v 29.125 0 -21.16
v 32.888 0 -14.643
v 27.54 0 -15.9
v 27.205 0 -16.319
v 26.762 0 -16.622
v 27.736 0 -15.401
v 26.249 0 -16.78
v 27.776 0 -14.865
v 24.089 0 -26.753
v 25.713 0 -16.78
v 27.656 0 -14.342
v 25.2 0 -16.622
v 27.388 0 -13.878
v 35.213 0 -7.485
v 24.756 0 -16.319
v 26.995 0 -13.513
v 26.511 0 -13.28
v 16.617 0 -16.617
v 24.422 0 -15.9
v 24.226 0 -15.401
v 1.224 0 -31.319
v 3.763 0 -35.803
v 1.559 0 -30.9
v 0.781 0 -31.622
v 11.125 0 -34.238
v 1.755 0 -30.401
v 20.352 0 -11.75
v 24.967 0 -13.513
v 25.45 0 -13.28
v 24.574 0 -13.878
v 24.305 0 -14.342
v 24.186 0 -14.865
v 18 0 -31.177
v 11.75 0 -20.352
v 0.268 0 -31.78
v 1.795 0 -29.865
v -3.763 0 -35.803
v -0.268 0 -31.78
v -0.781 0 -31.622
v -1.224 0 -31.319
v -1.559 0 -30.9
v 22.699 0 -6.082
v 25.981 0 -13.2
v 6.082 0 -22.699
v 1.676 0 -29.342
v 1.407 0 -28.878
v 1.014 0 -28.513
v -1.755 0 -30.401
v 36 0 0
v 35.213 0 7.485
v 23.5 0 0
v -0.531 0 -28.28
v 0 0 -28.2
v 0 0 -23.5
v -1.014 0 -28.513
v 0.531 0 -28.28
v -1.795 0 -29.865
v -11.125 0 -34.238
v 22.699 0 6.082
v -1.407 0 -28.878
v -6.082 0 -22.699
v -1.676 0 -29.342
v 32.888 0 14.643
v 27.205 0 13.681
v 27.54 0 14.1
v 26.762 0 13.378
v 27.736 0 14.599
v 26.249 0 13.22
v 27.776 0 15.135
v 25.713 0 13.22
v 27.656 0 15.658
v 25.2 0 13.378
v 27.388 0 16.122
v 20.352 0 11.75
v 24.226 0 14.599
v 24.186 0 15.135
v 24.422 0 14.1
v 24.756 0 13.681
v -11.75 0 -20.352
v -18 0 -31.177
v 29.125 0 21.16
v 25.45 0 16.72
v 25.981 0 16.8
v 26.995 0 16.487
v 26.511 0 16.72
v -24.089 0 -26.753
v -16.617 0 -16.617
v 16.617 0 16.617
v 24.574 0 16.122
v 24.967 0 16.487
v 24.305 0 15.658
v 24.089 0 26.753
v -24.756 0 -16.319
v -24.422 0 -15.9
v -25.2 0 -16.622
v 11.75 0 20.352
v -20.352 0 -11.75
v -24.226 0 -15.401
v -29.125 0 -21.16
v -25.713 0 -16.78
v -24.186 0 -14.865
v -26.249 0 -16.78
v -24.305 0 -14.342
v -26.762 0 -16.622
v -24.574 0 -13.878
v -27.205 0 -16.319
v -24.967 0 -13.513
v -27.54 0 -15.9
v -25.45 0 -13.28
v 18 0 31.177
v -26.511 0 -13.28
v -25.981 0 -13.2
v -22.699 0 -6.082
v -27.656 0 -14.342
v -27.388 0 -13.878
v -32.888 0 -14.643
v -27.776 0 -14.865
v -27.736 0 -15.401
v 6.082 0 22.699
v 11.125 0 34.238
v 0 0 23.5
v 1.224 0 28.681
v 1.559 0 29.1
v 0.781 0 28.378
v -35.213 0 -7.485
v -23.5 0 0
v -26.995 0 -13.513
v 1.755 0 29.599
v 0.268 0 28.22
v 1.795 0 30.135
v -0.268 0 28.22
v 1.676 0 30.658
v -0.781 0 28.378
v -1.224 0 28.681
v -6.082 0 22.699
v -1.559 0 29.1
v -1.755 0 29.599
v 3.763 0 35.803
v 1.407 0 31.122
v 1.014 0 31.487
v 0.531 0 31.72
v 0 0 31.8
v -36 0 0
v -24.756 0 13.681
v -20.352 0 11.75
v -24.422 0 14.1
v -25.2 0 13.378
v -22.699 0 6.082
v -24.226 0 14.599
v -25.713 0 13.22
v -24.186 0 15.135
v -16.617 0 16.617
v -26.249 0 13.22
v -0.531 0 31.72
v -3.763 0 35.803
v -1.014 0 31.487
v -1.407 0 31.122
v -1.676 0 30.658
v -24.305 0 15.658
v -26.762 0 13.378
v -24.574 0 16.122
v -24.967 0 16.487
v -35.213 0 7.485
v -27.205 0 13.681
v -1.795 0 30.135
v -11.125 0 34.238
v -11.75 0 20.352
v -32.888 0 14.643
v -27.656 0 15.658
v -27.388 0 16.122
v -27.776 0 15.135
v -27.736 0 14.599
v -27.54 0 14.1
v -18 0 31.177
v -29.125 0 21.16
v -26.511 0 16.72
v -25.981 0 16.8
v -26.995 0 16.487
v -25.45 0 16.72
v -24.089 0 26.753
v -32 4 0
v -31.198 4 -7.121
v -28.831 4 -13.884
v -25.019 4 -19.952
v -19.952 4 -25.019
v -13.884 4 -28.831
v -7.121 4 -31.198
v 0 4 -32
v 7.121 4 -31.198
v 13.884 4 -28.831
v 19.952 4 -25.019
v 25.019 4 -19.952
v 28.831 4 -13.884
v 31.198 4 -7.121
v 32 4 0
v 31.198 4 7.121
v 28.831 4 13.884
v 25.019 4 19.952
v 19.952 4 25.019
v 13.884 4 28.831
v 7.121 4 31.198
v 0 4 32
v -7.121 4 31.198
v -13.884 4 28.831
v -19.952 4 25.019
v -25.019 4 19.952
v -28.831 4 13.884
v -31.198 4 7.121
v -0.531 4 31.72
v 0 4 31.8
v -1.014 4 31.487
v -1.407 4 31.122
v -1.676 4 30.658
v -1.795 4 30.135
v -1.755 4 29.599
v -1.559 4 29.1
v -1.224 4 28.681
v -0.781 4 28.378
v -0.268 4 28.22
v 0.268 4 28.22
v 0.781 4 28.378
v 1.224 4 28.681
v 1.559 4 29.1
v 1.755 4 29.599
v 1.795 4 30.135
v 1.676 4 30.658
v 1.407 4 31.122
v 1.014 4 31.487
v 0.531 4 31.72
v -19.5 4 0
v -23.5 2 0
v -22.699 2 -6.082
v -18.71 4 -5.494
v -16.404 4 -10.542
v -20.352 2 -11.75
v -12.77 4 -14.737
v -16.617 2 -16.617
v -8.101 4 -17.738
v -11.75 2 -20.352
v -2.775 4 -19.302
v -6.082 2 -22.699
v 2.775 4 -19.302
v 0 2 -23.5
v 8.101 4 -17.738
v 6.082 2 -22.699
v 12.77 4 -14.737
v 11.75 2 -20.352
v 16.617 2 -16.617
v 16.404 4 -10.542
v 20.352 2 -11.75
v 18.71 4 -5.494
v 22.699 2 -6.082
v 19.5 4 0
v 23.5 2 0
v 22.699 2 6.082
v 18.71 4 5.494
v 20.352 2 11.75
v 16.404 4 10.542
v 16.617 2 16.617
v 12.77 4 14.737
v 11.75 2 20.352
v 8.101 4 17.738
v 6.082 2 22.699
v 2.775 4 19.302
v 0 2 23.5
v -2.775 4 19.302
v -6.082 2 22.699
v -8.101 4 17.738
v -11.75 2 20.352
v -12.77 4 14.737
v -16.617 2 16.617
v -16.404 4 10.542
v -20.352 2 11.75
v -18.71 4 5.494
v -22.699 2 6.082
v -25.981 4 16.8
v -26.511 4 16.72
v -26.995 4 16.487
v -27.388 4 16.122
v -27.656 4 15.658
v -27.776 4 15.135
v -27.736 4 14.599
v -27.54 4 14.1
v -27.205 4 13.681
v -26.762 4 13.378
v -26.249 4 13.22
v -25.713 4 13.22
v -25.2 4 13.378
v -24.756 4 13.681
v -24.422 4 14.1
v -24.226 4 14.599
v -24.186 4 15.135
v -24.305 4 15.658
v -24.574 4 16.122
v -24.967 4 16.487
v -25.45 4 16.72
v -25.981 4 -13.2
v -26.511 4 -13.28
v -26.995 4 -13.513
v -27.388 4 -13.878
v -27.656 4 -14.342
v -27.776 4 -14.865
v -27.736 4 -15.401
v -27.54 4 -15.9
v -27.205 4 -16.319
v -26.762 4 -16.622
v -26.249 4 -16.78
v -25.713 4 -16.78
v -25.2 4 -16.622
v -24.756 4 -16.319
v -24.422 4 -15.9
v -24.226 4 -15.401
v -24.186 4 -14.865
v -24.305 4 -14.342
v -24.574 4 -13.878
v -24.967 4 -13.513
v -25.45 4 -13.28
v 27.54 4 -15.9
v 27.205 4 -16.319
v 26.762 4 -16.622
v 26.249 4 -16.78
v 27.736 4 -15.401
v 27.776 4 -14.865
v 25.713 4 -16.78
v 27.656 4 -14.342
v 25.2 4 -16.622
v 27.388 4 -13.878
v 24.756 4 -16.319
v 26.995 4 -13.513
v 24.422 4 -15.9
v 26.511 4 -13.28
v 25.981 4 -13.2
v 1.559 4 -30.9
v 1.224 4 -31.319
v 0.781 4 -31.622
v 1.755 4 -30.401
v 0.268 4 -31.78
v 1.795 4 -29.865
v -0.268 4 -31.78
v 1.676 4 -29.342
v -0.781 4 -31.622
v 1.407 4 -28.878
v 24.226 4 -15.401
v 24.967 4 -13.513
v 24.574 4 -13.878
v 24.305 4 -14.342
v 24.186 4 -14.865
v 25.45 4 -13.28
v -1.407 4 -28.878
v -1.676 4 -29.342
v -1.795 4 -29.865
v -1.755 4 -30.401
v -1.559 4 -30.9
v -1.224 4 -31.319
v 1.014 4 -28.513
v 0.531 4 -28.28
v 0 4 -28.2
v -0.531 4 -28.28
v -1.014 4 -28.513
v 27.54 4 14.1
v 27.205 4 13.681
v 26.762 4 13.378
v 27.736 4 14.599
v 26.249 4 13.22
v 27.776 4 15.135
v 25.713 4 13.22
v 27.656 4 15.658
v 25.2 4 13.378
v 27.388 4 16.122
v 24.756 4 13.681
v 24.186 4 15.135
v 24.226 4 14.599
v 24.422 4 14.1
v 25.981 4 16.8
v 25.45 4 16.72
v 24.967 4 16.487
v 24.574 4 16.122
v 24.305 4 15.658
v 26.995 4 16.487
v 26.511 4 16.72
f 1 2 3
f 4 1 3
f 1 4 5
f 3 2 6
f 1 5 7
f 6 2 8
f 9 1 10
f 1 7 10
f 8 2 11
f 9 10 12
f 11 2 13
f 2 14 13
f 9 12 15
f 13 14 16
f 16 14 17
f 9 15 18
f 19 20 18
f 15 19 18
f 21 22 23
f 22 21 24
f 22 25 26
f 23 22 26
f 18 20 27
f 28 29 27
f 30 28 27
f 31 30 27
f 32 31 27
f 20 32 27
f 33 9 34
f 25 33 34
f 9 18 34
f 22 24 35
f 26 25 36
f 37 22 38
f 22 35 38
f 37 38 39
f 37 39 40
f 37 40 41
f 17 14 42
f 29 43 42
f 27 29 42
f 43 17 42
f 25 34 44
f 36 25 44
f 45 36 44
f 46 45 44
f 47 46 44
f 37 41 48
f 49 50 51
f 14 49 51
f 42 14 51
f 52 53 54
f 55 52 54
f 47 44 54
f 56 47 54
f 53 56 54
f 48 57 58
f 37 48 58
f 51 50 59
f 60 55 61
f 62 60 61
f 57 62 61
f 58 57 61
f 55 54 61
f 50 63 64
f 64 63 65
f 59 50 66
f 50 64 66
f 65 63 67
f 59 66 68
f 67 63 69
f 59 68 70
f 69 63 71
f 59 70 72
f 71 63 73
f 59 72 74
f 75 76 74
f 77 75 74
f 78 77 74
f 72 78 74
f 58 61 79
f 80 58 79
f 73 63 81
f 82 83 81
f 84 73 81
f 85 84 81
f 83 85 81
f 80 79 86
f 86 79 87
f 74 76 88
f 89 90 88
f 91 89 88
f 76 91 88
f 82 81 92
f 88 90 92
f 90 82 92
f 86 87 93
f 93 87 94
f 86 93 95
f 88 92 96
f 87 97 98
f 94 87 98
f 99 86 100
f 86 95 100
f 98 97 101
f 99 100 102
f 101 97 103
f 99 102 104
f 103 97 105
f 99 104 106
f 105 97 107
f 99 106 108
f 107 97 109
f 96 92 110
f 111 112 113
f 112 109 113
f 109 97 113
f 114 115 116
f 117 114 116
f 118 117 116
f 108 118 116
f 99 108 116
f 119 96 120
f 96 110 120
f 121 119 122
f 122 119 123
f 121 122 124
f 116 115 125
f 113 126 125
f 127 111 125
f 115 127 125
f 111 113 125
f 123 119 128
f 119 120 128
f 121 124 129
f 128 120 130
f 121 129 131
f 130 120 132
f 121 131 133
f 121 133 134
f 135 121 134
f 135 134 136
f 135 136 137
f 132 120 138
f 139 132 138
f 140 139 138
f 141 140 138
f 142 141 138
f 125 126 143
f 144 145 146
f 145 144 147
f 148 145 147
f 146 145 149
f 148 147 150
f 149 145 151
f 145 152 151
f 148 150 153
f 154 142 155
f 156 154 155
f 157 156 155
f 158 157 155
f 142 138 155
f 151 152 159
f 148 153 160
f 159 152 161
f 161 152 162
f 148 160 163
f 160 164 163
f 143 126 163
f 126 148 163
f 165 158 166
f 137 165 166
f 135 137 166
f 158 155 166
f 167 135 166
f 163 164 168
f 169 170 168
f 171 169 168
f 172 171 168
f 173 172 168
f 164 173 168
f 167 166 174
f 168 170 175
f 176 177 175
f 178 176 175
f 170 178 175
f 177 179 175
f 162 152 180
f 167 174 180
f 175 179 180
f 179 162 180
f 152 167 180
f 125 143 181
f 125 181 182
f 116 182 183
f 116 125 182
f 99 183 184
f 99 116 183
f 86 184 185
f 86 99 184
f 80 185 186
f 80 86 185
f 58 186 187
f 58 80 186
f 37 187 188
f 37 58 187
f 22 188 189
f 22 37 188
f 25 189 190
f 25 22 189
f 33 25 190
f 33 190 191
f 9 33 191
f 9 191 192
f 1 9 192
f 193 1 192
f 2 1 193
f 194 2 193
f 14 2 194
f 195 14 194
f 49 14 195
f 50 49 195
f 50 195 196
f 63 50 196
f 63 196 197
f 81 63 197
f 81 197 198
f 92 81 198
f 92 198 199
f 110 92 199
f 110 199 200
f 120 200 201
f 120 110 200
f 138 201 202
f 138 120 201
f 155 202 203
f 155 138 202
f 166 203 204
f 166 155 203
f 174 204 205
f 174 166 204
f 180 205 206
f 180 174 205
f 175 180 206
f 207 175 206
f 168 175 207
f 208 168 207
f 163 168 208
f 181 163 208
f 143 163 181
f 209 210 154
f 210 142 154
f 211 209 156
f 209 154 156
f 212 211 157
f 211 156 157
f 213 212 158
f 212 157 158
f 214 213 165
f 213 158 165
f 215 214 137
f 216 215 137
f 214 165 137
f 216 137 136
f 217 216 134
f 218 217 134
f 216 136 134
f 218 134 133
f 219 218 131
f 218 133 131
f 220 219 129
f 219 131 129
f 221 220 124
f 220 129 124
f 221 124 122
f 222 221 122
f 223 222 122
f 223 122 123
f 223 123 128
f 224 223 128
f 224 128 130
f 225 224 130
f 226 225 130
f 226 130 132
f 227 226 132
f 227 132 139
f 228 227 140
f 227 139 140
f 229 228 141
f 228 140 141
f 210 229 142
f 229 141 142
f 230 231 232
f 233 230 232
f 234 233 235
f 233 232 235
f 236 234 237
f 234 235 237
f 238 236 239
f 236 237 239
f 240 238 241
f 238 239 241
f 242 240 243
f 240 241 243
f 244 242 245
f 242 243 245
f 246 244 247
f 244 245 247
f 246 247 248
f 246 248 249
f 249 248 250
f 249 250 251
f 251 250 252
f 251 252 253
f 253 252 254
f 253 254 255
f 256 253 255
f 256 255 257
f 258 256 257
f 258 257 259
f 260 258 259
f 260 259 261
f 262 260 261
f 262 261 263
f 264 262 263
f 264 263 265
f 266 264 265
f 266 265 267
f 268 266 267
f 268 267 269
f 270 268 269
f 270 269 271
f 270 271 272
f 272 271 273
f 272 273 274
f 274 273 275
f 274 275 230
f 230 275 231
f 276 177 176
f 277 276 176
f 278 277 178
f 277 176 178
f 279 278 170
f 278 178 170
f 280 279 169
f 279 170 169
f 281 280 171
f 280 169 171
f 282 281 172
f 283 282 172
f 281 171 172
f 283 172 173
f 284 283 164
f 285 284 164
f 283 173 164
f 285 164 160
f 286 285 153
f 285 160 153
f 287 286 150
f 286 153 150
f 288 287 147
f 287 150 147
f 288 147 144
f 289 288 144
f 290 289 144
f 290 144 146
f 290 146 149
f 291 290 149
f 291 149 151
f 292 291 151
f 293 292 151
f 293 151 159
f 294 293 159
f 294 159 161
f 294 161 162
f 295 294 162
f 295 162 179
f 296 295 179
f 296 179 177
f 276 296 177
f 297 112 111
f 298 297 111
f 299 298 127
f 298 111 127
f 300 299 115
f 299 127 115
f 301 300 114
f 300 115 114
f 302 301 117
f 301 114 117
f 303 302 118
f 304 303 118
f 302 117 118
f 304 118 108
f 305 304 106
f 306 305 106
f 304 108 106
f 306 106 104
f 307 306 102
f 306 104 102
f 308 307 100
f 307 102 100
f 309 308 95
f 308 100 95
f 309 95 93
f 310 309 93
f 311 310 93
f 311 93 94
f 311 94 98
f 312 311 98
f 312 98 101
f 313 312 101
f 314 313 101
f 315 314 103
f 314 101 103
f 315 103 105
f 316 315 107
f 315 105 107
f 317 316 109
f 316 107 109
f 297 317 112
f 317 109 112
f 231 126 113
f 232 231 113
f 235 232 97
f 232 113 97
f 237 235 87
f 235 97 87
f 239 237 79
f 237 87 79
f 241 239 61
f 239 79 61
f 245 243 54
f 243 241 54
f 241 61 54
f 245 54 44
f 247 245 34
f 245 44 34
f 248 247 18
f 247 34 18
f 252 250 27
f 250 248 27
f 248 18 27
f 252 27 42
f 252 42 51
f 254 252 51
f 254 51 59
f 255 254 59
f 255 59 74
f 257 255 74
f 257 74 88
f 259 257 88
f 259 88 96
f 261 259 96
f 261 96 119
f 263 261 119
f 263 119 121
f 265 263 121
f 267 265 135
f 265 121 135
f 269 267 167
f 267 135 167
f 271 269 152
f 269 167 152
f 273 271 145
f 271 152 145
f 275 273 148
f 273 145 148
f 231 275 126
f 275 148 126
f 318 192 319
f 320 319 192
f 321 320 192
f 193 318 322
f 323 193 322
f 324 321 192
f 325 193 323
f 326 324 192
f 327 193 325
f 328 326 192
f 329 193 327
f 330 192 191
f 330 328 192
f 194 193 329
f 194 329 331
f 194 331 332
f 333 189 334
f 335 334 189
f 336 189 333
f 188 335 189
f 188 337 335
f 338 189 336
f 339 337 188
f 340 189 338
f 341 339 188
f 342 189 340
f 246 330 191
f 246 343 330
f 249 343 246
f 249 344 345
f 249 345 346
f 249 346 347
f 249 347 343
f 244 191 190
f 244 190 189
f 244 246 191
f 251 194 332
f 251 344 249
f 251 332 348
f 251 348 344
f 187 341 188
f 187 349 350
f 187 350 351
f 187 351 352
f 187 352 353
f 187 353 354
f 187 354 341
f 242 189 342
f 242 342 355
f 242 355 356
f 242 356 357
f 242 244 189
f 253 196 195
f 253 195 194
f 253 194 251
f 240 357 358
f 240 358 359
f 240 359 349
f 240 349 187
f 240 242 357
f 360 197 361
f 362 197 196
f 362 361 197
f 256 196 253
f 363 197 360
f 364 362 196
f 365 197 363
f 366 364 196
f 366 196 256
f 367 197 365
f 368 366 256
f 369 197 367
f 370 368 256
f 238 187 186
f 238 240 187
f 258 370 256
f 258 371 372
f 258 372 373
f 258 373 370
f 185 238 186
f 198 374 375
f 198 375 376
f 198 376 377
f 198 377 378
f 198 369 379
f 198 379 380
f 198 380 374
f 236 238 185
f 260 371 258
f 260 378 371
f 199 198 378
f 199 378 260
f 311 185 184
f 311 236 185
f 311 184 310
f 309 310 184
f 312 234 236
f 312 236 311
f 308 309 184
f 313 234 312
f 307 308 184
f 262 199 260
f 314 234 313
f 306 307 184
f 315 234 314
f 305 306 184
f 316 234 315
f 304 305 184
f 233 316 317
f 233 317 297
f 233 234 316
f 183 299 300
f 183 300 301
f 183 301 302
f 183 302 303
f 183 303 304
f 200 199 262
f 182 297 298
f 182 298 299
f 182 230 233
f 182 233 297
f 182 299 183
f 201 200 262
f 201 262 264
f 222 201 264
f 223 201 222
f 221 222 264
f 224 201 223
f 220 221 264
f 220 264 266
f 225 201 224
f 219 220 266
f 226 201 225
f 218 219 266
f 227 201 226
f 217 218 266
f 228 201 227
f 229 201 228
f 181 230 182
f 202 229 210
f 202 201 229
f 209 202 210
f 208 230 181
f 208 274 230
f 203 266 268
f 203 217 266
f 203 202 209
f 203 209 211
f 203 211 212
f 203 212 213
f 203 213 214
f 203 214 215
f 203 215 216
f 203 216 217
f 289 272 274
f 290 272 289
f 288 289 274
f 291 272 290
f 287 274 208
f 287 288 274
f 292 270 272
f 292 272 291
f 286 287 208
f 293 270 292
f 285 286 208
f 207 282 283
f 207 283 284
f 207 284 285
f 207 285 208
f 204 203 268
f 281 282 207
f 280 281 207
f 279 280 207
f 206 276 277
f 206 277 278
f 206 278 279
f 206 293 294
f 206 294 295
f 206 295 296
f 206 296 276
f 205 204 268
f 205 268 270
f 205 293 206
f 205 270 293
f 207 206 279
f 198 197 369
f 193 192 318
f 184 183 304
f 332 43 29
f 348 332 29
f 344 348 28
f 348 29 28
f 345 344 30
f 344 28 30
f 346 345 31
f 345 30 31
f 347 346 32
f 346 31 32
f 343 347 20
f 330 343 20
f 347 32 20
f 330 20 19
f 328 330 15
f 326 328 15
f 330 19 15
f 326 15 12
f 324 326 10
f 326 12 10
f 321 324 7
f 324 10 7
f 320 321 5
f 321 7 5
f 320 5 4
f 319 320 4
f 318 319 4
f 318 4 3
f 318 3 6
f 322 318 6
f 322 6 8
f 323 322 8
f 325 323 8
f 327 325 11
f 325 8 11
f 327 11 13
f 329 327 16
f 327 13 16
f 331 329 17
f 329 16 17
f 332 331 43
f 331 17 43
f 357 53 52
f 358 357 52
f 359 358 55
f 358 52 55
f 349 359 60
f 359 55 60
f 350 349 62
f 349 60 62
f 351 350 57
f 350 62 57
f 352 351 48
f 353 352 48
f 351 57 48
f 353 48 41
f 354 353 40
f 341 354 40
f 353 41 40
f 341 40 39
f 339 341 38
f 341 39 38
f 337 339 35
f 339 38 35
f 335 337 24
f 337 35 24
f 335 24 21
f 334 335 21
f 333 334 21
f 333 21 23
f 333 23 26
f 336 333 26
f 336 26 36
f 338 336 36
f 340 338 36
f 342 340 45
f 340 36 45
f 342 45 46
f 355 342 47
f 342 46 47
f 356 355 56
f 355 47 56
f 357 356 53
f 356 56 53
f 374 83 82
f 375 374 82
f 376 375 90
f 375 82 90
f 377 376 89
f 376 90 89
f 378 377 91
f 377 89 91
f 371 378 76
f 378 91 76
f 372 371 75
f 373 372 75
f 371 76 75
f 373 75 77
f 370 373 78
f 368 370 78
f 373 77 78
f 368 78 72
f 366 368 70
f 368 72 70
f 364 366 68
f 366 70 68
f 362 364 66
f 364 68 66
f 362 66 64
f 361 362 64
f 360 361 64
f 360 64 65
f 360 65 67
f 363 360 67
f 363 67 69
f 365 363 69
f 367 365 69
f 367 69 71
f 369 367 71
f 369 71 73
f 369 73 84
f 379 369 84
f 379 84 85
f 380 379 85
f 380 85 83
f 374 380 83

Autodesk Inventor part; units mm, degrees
ref_plane "YZ Plane" through (0, 0, 0) normal (1, 0, 0) x (0, 1, 0)
ref_plane "XZ Plane" through (0, 0, 0) normal (0, 1, 0) x (-1, 0, 0)
ref_plane "XY Plane" through (0, 0, 0) normal (0, 0, 1) x (1, 0, 0)
sketch "Sketch1" plane through (0, 0, 0) normal (0, 0, 1) x (1, 0, 0)
  line L0 (0, 0) -> (0, 4)
  line L1 (-23.5, 0) -> (-36, 0)
  line L2 (-36, 0) -> (-32, 4)
  line L3 (-32, 4) -> (-19.5, 4)
  line L4 (-19.5, 4) -> (-23.5, 2)
  line L5 (-23.5, 2) -> (-23.5, 0)
  point P0 (-29.75, 0)
  dimension "d0" = 47
  dimension "d1" = 12.5
  dimension "d2" = 2
  dimension "d3" = 4
  dimension "d4" = 2
  dimension "d5" = 45
revolve "Revolution1" add sketch "Sketch1" angle 360 about axis through (0, 0, 0) along (0, 1, 0)
sketch "Sketch2" plane through (0, 4, 0) normal (0, 1, 0) x (1, 0, 0)
  circle A0 centre (0, 0) radius 23.5 construction
  circle A1 centre (0, 0) radius 36 construction
  point P0 (0, -30)
  point P1 (25.9808, -15)
  point P2 (25.9808, 15)
  point P3 (0, 30)
  point P4 (-25.9808, 15)
  point P5 (-25.9808, -15)
  dimension "d10" = 360
  dimension "d19" = 30
hole "Hole1" at (0, 4, 30) at (25.9808, 4, 15) at (25.9808, 4, -15) at (0, 4, -30) at (-25.9808, 4, -15) at (-25.9808, 4, 15) direction (0, -1, 0) diameter 3.6 end through all clearance for "Slotted Cheese Head Screw ISO 1207" size "M3" standard "ISO"
properties part number "Ring_New"
